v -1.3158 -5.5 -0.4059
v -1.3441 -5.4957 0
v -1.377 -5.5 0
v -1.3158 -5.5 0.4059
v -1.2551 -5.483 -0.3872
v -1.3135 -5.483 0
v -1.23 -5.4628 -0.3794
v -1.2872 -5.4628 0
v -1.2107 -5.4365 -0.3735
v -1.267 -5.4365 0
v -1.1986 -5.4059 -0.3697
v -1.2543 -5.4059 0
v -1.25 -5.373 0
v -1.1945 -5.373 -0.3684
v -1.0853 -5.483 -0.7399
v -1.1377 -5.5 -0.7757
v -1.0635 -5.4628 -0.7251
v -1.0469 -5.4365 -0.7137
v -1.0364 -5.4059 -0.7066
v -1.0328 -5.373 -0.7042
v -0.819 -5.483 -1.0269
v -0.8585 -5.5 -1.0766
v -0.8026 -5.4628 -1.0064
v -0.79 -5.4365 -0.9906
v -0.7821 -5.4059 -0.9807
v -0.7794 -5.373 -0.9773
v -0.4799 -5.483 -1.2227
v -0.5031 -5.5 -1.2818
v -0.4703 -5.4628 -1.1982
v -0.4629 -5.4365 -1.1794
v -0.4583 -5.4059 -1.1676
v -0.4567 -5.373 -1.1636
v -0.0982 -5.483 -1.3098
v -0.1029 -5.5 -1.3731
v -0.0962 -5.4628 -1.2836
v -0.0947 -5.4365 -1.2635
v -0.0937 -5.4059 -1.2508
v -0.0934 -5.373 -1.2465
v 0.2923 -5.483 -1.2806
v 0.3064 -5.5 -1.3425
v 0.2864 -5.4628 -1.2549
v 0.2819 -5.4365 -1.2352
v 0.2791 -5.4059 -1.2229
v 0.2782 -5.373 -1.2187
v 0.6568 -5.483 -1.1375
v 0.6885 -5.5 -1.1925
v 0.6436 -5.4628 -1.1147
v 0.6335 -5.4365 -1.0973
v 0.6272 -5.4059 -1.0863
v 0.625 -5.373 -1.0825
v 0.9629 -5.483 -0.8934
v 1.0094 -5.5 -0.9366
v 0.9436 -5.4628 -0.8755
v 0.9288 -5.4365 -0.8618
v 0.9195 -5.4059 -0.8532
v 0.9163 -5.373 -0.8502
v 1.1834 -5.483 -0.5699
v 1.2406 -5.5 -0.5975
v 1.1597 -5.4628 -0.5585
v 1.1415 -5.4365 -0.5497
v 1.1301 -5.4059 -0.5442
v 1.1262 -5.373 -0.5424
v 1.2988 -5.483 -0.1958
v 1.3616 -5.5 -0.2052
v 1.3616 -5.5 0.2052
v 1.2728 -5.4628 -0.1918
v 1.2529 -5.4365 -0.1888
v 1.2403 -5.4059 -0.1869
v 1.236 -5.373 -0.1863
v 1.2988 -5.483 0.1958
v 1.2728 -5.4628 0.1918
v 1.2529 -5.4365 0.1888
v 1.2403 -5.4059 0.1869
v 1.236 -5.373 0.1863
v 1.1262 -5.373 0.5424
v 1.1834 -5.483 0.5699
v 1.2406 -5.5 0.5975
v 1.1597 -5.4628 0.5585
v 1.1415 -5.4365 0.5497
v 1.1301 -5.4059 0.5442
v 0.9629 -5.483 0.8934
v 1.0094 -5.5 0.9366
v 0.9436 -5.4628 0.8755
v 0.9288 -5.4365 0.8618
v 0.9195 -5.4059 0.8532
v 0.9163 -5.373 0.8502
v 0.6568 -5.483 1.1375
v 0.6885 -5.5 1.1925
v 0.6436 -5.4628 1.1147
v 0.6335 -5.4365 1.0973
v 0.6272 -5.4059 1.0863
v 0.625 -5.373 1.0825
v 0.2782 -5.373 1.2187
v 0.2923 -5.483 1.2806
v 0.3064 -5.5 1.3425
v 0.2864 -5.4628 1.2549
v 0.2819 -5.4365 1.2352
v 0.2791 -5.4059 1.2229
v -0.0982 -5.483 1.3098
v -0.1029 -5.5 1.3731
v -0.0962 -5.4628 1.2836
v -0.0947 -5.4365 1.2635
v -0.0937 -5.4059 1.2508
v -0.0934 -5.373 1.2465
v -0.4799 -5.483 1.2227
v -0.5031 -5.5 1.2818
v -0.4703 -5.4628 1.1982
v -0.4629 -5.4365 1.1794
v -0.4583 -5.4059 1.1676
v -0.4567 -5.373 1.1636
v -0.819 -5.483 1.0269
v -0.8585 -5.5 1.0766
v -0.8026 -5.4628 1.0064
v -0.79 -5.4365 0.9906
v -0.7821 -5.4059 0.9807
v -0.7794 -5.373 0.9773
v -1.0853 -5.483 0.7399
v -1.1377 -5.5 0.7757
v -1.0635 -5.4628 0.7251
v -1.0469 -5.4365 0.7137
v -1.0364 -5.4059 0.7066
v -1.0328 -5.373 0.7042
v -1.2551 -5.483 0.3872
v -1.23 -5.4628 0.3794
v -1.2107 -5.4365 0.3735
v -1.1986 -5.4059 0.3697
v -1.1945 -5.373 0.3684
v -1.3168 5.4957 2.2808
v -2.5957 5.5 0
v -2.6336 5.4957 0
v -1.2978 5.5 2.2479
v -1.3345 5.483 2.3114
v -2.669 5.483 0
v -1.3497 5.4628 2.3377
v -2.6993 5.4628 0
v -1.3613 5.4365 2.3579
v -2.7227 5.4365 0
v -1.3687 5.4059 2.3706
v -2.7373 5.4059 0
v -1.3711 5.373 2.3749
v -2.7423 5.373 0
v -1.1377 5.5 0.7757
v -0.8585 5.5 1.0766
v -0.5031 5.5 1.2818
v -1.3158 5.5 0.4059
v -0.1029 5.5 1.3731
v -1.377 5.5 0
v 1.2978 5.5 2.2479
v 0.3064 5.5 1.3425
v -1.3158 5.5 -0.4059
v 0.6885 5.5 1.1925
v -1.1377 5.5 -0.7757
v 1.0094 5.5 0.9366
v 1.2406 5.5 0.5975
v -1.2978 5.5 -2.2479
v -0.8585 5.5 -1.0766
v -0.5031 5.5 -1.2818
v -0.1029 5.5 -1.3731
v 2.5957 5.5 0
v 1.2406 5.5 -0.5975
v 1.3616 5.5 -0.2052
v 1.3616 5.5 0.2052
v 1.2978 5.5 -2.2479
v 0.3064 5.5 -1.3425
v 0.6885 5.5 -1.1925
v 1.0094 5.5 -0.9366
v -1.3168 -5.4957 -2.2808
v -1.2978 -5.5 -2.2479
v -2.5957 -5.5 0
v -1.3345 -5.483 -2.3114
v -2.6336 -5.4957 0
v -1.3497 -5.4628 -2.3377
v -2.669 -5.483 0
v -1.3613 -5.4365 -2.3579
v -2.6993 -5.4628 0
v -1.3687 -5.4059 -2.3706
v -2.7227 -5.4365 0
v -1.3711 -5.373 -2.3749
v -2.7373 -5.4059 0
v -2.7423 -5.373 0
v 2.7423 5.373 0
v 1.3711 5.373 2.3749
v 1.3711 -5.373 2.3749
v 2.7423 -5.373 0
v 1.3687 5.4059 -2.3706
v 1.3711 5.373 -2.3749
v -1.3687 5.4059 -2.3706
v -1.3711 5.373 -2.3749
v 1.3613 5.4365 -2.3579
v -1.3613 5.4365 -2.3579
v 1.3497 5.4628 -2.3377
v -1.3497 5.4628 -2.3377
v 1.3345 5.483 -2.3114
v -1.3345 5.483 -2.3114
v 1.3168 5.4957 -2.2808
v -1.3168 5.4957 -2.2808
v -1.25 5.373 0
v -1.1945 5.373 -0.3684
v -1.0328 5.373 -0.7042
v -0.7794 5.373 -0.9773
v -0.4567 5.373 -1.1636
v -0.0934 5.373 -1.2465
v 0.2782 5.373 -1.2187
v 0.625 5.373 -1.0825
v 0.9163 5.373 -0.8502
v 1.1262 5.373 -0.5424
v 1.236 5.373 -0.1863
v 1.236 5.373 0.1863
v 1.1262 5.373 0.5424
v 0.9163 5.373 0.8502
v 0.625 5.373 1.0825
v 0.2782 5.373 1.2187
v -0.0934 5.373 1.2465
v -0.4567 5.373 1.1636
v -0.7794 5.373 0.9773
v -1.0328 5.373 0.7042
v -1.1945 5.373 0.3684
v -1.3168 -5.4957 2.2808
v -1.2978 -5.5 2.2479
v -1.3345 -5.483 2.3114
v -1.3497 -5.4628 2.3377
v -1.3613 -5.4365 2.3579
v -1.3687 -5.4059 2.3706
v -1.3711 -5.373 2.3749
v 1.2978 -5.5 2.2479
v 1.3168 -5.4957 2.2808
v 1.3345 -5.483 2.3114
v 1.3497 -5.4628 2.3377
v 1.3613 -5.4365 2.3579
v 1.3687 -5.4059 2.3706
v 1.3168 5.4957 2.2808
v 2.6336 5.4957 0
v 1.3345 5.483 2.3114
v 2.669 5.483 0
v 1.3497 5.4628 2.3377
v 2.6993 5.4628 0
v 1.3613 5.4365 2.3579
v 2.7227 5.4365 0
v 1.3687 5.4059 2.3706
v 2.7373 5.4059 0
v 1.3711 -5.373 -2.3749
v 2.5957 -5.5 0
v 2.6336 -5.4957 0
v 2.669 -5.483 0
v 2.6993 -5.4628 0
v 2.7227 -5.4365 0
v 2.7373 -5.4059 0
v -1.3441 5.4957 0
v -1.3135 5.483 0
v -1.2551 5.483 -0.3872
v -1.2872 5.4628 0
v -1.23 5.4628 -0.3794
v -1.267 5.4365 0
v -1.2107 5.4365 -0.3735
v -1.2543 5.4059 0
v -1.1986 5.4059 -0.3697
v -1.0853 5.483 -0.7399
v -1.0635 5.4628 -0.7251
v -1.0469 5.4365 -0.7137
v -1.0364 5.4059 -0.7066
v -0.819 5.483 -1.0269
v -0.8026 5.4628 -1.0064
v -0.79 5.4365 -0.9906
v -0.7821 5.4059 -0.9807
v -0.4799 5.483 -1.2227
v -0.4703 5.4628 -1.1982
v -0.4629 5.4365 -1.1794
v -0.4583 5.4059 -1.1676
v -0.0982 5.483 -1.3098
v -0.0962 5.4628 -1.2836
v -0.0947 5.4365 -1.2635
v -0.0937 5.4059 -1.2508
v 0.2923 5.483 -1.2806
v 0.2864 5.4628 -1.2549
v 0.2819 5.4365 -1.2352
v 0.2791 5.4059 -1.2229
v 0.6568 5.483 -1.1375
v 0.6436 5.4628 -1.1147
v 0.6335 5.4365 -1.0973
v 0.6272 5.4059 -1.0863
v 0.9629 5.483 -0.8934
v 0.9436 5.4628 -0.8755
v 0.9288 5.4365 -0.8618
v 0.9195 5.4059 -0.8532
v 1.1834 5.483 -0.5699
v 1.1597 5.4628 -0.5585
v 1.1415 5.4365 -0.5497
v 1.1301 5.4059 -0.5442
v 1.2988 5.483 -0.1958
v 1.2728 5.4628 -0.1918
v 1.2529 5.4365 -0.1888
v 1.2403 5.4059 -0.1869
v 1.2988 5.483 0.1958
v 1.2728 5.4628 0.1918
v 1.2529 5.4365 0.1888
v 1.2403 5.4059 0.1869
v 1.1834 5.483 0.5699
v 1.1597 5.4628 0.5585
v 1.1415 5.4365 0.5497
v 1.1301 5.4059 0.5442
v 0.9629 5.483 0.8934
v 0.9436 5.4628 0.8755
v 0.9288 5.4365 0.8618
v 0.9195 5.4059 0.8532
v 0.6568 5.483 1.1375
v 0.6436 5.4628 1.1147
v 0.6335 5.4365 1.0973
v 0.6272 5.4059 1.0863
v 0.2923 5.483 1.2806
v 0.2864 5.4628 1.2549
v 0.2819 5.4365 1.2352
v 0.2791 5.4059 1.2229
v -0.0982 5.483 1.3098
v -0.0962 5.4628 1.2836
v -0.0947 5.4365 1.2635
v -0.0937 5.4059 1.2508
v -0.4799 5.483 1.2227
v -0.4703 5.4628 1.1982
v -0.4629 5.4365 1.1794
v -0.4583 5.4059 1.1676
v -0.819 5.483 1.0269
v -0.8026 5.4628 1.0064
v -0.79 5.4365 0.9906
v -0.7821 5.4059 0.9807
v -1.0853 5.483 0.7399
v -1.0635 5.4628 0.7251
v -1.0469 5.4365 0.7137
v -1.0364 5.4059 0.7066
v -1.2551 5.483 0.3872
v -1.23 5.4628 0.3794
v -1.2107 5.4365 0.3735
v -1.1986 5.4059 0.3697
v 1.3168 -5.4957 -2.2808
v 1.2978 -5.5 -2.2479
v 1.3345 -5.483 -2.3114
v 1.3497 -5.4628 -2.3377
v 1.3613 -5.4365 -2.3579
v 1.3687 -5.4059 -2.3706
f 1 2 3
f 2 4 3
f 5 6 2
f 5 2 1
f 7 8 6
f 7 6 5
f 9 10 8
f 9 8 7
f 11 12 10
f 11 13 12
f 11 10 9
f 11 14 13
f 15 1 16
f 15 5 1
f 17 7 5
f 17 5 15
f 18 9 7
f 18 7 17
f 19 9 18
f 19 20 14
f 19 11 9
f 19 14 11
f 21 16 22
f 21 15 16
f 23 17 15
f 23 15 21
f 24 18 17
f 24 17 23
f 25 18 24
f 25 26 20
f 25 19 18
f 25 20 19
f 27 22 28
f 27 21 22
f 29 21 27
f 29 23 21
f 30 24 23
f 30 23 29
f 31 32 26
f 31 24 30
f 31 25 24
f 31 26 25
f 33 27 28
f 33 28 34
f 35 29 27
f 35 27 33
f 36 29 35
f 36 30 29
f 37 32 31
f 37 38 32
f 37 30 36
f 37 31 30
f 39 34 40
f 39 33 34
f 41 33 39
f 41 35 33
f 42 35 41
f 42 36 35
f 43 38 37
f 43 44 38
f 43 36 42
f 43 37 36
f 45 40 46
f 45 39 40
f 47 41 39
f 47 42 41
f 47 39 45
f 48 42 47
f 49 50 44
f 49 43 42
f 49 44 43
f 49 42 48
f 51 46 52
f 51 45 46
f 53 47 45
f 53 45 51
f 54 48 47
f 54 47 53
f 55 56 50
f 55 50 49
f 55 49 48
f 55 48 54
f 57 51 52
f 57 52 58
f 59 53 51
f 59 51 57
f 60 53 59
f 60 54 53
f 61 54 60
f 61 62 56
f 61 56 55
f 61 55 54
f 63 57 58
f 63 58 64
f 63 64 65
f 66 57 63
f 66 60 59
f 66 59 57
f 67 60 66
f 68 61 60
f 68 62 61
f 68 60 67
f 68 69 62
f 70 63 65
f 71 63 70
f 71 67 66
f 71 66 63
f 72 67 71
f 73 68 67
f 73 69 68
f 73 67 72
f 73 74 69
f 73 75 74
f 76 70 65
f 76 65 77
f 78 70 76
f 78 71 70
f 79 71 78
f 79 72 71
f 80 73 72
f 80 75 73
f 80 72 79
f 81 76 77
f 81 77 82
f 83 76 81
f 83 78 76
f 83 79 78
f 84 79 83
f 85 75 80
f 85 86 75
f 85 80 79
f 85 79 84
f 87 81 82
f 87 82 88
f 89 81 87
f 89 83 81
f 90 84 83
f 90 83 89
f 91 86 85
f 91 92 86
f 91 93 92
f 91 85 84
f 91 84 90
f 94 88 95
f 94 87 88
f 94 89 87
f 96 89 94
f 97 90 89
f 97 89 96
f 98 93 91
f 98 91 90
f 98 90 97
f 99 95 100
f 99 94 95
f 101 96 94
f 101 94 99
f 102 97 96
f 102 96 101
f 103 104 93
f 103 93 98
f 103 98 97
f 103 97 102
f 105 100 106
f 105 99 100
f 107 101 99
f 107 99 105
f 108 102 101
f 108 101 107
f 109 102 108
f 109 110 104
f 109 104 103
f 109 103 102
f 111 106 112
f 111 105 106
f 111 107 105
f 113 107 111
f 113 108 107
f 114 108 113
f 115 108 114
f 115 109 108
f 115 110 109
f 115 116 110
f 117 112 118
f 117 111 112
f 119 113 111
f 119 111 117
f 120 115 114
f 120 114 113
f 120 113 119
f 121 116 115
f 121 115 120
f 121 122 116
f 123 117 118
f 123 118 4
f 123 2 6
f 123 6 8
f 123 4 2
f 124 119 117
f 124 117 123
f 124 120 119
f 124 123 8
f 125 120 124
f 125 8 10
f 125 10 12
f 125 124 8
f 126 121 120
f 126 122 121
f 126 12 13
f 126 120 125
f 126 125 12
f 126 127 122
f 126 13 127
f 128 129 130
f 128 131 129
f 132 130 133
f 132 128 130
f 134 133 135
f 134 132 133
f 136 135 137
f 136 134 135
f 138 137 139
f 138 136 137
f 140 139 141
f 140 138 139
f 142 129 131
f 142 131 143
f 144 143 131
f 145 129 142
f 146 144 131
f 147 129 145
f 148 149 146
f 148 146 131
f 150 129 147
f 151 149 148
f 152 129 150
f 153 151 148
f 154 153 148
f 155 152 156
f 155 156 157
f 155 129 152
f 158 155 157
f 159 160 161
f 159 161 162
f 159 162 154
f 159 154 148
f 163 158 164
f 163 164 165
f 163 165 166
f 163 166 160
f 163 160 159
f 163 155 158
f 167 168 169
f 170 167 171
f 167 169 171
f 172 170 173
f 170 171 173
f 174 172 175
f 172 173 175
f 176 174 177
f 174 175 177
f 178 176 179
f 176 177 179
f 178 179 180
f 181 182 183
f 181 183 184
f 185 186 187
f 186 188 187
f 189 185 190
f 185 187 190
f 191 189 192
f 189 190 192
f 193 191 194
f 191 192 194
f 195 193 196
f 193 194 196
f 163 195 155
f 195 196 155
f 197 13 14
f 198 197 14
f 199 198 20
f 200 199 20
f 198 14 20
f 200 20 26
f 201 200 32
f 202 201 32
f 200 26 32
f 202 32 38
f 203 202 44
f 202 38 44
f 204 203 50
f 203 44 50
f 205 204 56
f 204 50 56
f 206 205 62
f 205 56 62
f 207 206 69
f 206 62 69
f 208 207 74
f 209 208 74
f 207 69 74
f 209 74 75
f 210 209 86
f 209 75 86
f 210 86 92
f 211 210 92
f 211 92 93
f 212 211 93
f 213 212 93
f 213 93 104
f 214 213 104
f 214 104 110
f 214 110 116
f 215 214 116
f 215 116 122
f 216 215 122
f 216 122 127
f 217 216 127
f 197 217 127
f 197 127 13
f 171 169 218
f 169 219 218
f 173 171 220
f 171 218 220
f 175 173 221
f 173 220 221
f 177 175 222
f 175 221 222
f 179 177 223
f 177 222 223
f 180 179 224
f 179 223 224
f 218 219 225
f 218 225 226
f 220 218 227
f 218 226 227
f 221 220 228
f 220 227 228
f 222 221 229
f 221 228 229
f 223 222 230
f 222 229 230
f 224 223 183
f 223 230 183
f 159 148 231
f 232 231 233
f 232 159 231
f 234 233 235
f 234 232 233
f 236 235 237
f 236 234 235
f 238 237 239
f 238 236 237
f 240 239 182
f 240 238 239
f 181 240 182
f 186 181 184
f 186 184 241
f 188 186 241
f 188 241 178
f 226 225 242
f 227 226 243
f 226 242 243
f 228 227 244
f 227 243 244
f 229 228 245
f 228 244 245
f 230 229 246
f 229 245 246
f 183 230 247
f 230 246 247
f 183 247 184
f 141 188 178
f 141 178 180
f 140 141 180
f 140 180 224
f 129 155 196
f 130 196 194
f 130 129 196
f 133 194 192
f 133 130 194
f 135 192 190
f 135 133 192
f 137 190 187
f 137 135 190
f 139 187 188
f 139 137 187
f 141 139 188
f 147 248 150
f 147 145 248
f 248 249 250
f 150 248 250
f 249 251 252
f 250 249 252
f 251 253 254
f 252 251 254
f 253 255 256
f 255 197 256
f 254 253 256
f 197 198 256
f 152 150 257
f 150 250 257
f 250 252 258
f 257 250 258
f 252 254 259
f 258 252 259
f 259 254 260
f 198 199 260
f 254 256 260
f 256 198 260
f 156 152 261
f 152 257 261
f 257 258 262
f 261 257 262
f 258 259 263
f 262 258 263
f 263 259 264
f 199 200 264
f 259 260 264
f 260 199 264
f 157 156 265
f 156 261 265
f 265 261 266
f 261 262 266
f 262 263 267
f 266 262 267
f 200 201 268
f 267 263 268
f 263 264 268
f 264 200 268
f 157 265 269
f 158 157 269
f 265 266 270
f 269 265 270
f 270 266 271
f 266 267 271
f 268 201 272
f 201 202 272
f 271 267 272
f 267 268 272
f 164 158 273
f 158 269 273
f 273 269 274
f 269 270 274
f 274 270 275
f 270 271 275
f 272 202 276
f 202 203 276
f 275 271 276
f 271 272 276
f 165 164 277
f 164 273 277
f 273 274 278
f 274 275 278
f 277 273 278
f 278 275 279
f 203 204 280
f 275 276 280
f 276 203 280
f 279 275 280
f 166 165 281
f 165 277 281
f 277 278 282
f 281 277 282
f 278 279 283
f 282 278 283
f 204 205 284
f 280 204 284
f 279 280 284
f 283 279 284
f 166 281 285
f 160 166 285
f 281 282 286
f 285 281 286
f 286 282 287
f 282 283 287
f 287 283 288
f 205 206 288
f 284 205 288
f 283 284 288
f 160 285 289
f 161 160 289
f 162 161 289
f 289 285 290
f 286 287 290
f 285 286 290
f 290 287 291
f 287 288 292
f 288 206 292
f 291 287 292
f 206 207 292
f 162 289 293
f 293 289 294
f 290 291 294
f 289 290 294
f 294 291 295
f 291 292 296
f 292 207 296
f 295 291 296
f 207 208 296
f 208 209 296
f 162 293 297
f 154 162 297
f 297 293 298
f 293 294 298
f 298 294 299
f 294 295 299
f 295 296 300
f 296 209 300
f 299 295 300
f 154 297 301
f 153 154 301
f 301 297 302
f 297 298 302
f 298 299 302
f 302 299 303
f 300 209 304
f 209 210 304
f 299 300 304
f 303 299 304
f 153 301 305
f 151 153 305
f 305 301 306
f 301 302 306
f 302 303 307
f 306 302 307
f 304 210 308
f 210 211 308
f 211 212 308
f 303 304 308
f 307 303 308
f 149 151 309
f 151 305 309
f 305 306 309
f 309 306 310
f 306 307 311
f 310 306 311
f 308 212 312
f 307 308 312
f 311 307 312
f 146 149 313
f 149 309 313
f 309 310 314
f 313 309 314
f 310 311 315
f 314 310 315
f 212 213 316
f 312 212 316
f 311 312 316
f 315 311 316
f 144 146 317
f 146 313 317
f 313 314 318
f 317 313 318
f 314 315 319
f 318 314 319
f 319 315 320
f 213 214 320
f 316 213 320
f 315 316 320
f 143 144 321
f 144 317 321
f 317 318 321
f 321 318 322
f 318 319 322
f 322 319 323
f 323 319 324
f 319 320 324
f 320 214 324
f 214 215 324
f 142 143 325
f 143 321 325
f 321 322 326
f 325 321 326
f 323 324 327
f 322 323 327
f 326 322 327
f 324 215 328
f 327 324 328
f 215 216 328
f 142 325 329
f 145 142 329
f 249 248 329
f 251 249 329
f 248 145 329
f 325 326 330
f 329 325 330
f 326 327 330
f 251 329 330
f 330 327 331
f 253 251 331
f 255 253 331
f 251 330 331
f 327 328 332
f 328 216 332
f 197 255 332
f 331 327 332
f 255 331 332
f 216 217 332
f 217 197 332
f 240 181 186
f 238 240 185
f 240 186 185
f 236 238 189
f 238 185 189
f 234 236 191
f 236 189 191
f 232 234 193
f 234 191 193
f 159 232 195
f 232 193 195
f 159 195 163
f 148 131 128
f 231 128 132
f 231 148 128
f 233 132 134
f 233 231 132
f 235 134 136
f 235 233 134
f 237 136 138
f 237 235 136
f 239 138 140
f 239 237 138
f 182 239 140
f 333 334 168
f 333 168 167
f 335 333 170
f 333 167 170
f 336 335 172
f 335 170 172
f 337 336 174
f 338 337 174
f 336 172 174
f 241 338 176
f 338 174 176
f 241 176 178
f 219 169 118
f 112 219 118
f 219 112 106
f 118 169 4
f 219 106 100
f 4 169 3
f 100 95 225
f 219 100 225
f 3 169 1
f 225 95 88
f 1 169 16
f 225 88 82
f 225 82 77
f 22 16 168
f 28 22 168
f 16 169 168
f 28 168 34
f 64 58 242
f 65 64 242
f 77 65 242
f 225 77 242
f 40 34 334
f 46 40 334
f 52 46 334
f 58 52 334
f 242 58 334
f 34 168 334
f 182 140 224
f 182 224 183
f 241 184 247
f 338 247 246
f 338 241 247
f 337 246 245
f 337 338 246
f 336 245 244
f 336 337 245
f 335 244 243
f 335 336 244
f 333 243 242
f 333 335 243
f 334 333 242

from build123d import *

# Parameters (mm, degrees)
BOSS_EXTRUDE1_DEPTH   = 5.5
M3X0_5_TAPPED_HOLE1_D = 2.5
FILLET1_R             = 0.127


with BuildPart() as part:
    # Sketch1 → Boss-Extrude1 (new, symmetric)
    with BuildSketch(Plane(origin=(0, 0, 0), x_dir=(1, 0, 0), z_dir=(0, 1, 0))):
        Polygon((2.742298309, 0), (1.371149154, 2.3749), (-1.371149154, 2.3749), (-2.742298309, 0), (-1.371149154, -2.3749), (1.371149154, -2.3749), align=None)
    extrude(amount=BOSS_EXTRUDE1_DEPTH, both=True)

    # M3x0.5 Tapped Hole1 (through all)
    with Locations(Plane(origin=(0, 5.5, 0), x_dir=(1, 0, 0), z_dir=(0, 1, 0))):
        with Locations((0, 0)):
            Hole(M3X0_5_TAPPED_HOLE1_D / 2)

    # Fillet1
    fillet1_edges = [part.edges().sort_by_distance(p)[0] for p in [
        (0, 5.5, -2.3749),
        (-2.056723731, 5.5, -1.18745),
        (-2.056723731, 5.5, 1.18745),
        (0, 5.5, 2.3749),
        (1.25, 5.5, 0),
        (1.25, -5.5, 0),
        (2.056723731, 5.5, 1.18745),
        (0, -5.5, 2.3749),
        (-2.056723731, -5.5, 1.18745),
        (-2.056723731, -5.5, -1.18745),
        (2.056723731, 5.5, -1.18745),
        (0, -5.5, -2.3749),
        (2.056723731, -5.5, -1.18745),
        (2.056723731, -5.5, 1.18745),
    ]]
    fillet(fillet1_edges, radius=FILLET1_R)


solid = part.part
